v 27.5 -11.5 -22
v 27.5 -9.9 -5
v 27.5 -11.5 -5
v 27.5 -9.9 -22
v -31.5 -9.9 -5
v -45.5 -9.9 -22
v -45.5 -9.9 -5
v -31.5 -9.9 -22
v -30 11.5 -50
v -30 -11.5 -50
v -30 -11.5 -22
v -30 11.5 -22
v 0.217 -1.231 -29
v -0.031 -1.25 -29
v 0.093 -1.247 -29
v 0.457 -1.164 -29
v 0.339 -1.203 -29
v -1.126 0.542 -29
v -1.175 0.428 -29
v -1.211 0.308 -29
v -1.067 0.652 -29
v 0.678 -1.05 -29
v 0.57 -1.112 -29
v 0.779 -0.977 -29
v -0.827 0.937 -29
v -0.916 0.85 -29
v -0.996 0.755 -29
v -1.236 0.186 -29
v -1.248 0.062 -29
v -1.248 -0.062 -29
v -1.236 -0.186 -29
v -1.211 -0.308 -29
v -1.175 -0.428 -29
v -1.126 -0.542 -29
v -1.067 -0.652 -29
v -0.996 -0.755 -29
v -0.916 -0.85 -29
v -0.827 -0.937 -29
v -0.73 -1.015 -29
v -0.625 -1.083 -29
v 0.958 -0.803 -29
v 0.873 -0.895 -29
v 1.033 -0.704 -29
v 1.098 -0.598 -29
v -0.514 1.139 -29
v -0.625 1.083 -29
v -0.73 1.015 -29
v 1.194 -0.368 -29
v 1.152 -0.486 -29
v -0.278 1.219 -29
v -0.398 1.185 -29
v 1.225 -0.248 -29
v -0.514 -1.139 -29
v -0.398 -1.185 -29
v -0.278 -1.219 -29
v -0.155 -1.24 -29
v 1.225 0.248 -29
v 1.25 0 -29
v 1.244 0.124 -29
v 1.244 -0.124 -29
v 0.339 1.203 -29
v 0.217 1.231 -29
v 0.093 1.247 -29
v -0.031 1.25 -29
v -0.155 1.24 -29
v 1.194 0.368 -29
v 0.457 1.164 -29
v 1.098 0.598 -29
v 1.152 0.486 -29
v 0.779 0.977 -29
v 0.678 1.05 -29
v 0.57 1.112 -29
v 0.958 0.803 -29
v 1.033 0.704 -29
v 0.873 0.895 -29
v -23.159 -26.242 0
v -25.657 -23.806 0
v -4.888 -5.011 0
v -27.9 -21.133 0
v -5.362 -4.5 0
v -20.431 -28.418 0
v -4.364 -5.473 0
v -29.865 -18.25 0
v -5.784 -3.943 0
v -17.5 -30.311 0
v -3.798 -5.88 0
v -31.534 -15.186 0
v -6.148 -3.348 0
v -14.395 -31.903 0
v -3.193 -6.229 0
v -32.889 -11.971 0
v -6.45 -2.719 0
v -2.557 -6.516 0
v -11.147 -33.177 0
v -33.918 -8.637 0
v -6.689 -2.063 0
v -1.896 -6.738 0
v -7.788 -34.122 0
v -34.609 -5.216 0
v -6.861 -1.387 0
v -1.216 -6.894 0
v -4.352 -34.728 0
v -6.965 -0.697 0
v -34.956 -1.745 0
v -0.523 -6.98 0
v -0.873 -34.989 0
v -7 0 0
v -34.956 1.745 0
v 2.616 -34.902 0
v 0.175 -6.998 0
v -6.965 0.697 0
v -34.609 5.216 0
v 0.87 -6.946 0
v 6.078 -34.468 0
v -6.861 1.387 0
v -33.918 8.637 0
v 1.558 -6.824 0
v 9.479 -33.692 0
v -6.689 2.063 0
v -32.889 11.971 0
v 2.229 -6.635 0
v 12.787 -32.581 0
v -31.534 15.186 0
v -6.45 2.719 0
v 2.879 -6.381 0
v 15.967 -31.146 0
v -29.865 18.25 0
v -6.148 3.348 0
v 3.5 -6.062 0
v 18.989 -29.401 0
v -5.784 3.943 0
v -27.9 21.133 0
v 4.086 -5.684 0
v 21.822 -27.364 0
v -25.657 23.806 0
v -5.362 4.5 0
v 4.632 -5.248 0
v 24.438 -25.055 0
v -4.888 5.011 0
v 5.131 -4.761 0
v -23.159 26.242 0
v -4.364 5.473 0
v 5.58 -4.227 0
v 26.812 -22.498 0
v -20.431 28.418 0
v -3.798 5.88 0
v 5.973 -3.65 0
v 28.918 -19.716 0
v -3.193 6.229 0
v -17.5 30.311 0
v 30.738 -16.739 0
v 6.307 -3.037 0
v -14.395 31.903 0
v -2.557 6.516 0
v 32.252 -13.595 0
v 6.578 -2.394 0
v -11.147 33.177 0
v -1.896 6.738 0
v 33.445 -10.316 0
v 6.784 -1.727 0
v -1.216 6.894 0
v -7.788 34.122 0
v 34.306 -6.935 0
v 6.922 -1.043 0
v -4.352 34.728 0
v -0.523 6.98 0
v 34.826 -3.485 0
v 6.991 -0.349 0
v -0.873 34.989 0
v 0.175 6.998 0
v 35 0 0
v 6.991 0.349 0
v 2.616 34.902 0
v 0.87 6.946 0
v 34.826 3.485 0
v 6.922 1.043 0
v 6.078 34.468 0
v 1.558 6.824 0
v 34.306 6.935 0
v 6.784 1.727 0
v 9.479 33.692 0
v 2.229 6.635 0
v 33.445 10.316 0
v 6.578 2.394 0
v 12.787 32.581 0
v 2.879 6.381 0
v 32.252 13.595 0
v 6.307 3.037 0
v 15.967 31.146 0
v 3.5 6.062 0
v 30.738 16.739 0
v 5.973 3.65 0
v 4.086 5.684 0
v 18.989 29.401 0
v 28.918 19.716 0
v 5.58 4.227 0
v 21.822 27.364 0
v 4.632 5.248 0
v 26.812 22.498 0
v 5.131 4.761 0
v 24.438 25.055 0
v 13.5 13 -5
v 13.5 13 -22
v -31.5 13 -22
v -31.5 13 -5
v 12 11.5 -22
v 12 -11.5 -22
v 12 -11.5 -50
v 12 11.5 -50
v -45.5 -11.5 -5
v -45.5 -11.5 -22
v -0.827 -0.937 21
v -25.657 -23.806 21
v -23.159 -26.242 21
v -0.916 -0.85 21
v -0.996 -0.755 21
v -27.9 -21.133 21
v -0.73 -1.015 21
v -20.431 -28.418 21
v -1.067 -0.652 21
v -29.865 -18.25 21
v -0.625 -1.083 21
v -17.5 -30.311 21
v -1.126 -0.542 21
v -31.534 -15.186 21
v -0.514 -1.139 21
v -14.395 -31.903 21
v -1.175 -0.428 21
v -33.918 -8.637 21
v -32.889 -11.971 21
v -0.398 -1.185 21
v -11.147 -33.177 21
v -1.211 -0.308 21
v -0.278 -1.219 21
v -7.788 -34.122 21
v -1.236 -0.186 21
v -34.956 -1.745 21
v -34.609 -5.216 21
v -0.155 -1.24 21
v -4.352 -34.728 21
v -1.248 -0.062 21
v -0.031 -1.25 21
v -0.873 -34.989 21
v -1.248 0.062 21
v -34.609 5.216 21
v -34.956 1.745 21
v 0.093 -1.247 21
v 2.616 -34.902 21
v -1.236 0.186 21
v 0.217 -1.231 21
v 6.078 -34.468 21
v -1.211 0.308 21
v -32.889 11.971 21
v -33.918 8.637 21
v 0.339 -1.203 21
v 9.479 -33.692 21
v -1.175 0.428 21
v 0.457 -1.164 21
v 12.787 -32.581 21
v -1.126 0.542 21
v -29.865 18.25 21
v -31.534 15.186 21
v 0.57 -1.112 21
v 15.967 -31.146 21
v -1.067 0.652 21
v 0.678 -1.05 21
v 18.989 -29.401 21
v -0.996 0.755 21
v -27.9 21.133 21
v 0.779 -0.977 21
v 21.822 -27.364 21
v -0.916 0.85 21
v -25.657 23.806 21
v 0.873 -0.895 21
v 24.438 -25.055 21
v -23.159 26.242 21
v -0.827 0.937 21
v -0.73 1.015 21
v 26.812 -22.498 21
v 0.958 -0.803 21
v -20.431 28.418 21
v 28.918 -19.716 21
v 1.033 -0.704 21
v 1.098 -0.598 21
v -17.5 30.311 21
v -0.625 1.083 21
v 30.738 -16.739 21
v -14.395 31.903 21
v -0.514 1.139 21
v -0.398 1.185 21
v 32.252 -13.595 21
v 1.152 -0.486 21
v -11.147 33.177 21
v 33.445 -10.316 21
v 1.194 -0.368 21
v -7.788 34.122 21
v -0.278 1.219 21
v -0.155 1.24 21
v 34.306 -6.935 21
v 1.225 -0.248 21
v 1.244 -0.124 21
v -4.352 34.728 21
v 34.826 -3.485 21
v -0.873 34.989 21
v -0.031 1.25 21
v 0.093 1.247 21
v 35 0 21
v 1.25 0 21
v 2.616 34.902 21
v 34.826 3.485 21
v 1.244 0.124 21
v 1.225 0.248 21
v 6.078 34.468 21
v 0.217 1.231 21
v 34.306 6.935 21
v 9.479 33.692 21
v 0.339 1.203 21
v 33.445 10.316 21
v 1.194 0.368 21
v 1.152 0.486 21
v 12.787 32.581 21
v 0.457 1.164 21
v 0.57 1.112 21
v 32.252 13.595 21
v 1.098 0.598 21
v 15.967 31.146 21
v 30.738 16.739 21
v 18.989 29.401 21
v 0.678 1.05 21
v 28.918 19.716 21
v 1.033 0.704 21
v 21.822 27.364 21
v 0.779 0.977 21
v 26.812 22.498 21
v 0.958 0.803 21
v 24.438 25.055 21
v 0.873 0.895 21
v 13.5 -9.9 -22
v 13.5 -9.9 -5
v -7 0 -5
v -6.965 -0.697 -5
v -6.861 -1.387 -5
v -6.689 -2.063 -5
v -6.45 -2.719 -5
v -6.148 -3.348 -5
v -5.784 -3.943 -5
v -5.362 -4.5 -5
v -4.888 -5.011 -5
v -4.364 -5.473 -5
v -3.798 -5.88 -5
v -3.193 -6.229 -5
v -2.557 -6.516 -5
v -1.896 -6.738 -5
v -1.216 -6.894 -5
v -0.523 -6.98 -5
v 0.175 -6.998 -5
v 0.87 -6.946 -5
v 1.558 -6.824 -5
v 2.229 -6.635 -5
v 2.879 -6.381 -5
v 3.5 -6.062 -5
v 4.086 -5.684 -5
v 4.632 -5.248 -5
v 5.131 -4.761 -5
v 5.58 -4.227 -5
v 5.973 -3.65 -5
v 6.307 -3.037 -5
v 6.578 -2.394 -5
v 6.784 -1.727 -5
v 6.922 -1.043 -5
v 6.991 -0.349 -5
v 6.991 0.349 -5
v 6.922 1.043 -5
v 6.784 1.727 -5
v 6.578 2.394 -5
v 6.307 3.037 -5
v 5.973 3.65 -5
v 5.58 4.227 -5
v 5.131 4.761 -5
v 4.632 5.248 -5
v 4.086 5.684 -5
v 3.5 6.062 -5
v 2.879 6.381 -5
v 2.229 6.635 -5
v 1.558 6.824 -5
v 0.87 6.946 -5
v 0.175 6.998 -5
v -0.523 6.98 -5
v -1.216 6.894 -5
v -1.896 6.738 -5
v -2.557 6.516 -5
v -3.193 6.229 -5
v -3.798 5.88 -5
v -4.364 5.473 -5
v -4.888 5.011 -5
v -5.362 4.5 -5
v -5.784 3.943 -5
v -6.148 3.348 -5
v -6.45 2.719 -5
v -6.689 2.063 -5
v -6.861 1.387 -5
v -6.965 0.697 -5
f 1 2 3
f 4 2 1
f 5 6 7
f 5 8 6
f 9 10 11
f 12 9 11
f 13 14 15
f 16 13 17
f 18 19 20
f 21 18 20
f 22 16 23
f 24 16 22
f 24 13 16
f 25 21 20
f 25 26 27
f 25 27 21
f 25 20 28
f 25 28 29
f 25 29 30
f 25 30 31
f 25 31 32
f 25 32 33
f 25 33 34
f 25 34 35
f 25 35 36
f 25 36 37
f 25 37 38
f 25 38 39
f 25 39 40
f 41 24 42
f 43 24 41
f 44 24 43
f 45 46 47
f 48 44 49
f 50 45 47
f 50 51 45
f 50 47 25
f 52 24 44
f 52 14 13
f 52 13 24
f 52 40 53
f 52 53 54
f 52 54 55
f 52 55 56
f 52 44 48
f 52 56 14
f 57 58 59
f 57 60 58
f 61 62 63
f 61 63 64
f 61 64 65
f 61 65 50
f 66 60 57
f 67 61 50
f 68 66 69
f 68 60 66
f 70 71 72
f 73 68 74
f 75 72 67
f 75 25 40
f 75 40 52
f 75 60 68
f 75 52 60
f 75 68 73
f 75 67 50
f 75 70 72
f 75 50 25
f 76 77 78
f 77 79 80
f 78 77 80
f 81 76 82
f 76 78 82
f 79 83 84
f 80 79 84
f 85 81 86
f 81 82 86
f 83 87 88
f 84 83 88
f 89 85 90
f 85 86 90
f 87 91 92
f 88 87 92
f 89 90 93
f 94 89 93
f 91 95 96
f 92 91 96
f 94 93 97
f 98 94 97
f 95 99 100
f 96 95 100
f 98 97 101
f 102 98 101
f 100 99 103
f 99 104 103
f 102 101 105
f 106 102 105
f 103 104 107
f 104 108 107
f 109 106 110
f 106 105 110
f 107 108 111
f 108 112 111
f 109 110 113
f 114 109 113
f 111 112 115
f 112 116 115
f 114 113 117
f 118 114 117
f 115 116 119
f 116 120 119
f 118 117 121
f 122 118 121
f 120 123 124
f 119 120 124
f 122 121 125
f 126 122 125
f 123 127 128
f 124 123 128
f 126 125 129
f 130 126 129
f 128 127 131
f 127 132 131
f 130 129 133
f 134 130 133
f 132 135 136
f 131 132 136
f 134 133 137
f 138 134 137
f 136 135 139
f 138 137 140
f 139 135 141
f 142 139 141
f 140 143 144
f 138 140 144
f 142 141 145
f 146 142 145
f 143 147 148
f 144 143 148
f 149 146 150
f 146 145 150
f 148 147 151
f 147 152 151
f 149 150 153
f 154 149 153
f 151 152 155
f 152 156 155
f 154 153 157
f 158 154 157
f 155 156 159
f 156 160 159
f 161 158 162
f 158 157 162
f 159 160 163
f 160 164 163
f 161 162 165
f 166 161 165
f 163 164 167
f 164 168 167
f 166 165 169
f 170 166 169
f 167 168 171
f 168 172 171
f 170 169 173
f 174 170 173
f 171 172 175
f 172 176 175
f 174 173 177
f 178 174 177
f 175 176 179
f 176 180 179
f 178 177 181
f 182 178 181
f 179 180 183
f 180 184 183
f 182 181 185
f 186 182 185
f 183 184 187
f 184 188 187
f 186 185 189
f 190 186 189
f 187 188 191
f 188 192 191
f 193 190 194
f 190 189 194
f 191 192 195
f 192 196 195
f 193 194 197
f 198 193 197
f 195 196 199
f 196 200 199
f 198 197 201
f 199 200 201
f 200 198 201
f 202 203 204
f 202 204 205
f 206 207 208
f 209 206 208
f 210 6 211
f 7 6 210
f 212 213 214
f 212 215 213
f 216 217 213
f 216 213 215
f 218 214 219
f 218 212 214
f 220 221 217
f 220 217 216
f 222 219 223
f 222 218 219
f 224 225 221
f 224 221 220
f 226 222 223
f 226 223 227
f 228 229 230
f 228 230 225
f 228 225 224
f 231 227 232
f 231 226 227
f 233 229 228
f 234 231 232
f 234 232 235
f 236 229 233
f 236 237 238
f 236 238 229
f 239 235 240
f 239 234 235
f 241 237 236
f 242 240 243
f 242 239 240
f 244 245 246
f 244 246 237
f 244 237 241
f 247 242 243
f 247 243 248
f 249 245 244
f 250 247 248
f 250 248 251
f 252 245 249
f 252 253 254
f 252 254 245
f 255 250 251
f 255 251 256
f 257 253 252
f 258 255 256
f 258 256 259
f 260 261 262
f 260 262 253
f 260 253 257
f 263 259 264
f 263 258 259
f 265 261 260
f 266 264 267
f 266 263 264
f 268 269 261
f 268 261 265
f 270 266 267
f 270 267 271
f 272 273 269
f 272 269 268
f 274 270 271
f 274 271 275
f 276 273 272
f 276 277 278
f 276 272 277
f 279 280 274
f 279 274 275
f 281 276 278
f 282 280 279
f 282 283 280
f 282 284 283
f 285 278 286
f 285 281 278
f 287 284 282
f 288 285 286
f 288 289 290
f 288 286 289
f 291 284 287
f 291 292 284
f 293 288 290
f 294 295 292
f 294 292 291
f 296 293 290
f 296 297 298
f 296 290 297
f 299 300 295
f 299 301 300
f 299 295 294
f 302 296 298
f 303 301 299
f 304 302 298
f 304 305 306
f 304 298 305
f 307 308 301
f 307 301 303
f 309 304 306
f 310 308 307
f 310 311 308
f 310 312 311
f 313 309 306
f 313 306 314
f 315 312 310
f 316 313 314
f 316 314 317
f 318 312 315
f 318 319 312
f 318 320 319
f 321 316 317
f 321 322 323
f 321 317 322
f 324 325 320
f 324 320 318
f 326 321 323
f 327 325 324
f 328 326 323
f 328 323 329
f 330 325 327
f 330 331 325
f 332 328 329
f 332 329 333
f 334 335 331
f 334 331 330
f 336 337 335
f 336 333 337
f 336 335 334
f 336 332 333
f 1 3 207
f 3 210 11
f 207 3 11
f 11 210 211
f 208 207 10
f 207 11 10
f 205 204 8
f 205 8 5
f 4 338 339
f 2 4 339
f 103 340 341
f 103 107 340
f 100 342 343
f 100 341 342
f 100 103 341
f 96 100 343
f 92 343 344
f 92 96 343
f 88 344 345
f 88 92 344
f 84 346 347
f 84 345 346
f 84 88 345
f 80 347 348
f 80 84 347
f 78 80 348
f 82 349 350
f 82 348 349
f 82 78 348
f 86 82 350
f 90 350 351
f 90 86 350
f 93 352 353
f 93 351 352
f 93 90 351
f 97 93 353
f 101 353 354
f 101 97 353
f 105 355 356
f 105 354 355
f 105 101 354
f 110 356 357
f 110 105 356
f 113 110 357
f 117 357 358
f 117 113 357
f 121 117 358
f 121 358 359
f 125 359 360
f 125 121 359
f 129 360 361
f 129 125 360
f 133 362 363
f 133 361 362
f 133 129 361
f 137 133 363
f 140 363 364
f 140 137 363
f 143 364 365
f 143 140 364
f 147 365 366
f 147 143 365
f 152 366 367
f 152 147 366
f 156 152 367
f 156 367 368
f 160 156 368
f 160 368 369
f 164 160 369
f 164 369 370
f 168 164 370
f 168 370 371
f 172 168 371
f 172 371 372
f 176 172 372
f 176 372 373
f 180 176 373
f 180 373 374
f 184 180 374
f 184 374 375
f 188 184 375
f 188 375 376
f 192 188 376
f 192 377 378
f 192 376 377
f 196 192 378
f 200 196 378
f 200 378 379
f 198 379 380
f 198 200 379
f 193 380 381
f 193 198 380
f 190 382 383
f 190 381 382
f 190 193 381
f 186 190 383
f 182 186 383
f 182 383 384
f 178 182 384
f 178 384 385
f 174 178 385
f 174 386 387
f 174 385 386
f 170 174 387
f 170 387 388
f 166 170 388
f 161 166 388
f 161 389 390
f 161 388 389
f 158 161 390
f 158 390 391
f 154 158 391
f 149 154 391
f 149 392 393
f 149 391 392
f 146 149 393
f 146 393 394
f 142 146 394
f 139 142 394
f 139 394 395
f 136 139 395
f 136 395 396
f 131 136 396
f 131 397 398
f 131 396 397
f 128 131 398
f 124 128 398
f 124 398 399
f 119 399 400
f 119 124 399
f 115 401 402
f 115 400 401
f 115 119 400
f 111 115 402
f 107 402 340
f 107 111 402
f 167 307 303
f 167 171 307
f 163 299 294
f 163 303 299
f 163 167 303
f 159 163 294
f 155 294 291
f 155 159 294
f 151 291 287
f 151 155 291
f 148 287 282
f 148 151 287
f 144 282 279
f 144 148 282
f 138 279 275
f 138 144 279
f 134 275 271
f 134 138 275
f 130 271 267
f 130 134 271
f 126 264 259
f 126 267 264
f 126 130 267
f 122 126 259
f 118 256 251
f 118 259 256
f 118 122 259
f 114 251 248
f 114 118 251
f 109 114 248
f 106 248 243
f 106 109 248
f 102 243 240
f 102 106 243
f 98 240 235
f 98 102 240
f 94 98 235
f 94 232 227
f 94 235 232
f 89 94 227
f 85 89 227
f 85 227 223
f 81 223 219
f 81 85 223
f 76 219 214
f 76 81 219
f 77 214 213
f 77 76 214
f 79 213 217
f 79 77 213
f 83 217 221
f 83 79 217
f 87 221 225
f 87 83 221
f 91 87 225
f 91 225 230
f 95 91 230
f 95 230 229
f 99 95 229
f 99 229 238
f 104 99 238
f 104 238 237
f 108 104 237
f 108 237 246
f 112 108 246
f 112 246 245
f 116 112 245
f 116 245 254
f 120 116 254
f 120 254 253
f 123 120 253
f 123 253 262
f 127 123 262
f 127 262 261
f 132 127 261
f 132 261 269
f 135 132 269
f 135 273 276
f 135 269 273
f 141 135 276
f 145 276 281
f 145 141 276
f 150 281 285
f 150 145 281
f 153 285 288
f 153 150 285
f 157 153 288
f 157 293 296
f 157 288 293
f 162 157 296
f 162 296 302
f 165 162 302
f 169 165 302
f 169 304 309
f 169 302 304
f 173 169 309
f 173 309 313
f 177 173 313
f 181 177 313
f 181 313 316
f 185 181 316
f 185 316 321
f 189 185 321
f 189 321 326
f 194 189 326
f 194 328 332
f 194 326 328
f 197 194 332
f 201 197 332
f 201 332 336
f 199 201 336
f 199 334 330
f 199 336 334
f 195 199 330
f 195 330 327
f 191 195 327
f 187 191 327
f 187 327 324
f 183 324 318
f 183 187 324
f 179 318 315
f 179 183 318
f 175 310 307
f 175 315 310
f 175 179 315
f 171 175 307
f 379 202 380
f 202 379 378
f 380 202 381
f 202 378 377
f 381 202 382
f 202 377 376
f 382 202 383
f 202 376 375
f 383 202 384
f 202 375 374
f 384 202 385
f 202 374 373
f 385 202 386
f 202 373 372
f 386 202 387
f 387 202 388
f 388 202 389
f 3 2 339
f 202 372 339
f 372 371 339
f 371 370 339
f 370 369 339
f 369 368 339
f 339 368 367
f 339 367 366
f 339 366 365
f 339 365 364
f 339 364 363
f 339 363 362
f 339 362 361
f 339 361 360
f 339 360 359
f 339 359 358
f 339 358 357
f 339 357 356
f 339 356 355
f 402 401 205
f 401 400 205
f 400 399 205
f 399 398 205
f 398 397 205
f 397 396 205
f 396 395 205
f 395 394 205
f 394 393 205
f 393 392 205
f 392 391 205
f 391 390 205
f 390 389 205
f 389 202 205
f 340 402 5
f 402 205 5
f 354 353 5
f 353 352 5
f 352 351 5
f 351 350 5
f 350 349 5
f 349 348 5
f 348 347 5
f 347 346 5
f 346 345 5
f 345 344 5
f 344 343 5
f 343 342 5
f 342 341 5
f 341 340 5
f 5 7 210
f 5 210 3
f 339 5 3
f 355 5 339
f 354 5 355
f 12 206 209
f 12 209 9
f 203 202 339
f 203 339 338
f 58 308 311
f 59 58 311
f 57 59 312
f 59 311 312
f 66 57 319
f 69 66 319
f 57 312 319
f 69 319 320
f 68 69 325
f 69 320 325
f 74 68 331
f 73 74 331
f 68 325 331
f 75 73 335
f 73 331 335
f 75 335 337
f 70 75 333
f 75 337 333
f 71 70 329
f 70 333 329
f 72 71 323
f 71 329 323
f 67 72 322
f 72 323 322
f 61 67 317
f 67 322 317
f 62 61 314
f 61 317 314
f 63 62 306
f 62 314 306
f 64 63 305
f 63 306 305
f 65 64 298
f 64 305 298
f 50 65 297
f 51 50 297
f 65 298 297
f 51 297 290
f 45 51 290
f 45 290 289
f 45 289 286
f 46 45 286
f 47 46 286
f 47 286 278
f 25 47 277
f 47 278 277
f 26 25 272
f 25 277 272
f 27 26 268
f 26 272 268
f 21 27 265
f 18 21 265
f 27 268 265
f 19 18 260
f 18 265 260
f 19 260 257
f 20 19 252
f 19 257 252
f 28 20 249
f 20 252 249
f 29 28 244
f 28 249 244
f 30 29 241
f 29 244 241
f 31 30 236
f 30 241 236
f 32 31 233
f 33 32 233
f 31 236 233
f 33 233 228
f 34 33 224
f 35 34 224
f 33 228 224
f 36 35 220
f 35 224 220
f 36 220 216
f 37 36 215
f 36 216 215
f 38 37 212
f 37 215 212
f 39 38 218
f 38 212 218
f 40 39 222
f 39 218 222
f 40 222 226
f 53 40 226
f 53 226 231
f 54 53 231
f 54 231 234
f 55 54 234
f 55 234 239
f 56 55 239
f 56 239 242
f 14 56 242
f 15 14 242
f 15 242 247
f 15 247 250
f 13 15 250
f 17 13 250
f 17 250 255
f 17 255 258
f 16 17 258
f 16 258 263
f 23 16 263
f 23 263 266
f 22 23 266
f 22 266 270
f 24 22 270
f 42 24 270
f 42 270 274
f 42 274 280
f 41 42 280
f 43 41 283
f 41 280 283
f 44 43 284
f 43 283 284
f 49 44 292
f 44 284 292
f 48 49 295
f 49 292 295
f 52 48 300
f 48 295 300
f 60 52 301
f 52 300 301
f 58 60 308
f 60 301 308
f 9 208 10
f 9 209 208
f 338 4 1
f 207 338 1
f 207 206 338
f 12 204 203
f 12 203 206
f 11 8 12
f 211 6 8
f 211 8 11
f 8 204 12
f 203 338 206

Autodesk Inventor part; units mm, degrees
ref_plane "YZ Plane" through (0, 0, 0) normal (1, 0, 0) x (0, 1, 0)
ref_plane "XZ Plane" through (0, 0, 0) normal (0, 1, 0) x (-1, 0, 0)
ref_plane "XY Plane" through (0, 0, 0) normal (0, 0, 1) x (1, 0, 0)
sketch "Sketch1" plane through (0, 0, 0) normal (0, 0, 1) x (1, 0, 0)
  circle A0 centre (0, 0) radius 35
  dimension "d0" = 70
extrude "Extrusion1" add sketch "Sketch1" along normal blind 21
sketch "Sketch2" plane through (0, 0, 0) normal (0, 0, -1) x (-1, 0, 0)
  circle A0 centre (0, 0) radius 7
  dimension "d3" = 14
extrude "Extrusion2" add sketch "Sketch2" along normal blind 5
sketch "Sketch3" plane through (0, 0, -5) normal (0, 0, -1) x (-1, 0, 0)
  line L0 (-12, 11.5) -> (30, 11.5)
  line L1 (30, 11.5) -> (30, -11.5)
  line L2 (30, -11.5) -> (-12, -11.5)
  line L3 (-12, -11.5) -> (-12, 11.5)
  point P0 (0, 0)
  point P1 (30, 0)
  point P2 (-12, 0)
  dimension "d6" = 23
  dimension "d7" = 42
  dimension "d8" = 12
extrude "Extrusion3" add sketch "Sketch3" along normal blind 45
sketch "Sketch4" plane through (-30, 11.5, -5) normal (0, 1, 0) x (1, 0, 0)
  line L0 (42, 0) -> (0, 0) projected
  line L1 (0, 0) -> (42, 0)
  line L2 (42, 0) -> (42, 17)
  line L3 (42, 17) -> (0, 17)
  line L4 (0, 17) -> (0, 0)
  point P0 (30, -5)
  dimension "d11" = 17
  dimension "d12" = 42
extrude "Extrusion4" add sketch "Sketch4" along normal blind 1.5
sketch "Sketch5" plane through (12, -11.5, -50) normal (1, 0, 0) x (0, 0, -1)
  line L0 (-28, 24.5) -> (-45, 24.5) projected
  line L1 (-28, 24.5) -> (-45, 24.5)
  line L2 (-45, 24.5) -> (-45, 0)
  line L3 (-45, 0) -> (-28, 0)
  line L4 (-28, 0) -> (-28, 24.5)
  point P0 (-50, 11.5)
extrude "Extrusion5" add sketch "Sketch5" along normal blind 1.5
sketch "Sketch6" plane through (-30, -11.5, -50) normal (-1, 0, 0) x (0, 0, 1)
  point P0 (50, 11.5)
sketch "Sketch7" plane through (-30, -11.5, -50) normal (-1, 0, 0) x (0, 0, 1)
  line L0 (28, 23) -> (28, 24.5) projected
  line L1 (45, 0) -> (45, 24.5) projected
  line L2 (28, 24.5) -> (45, 24.5)
  line L3 (45, 24.5) -> (45, 0)
  line L4 (45, 0) -> (28, 0)
  line L5 (28, 0) -> (28, 24.5)
  point P0 (50, 11.5)
extrude "Extrusion6" add sketch "Sketch7" along normal blind 1.5
sketch "Sketch8" plane through (-31.5, -11.5, -50) normal (-1, 0, 0) x (0, 0, 1)
  line L0 (45, 24.5) -> (45, 0) projected
  line L1 (28, 23) -> (28, 0) projected
  line L2 (45, 0) -> (28, 0)
  line L3 (28, 0) -> (28, 1.6)
  line L4 (28, 1.6) -> (45, 1.6)
  line L5 (45, 1.6) -> (45, 0)
  point P0 (50, 11.5)
  dimension "d19" = 1.6
extrude "Extrusion7" add sketch "Sketch8" along normal blind 14
sketch "Sketch9" plane through (13.5, -11.5, -50) normal (1, 0, 0) x (0, 0, -1)
  line L0 (-45, 0) -> (-28, 0) projected
  line L1 (-28, 23) -> (-28, 0) projected
  line L2 (-45, 0) -> (-28, 0)
  line L3 (-28, 0) -> (-28, 1.6)
  line L4 (-28, 1.6) -> (-45, 1.6)
  line L5 (-45, 1.6) -> (-45, 0)
  point P0 (-50, 11.5)
  dimension "d22" = 1.6
extrude "Extrusion8" add sketch "Sketch9" along normal blind 14
sketch "Sketch10" plane through (0, 0, 21) normal (0, 0, 1) x (1, 0, 0)
  circle A0 centre (0, 0) radius 7 projected
  circle A1 centre (0, 0) radius 1.25
  dimension "d25" = 2.5
extrude "Extrusion9" cut sketch "Sketch10" against normal blind 50 contours A1
properties part number "Rueda Izquierda"
